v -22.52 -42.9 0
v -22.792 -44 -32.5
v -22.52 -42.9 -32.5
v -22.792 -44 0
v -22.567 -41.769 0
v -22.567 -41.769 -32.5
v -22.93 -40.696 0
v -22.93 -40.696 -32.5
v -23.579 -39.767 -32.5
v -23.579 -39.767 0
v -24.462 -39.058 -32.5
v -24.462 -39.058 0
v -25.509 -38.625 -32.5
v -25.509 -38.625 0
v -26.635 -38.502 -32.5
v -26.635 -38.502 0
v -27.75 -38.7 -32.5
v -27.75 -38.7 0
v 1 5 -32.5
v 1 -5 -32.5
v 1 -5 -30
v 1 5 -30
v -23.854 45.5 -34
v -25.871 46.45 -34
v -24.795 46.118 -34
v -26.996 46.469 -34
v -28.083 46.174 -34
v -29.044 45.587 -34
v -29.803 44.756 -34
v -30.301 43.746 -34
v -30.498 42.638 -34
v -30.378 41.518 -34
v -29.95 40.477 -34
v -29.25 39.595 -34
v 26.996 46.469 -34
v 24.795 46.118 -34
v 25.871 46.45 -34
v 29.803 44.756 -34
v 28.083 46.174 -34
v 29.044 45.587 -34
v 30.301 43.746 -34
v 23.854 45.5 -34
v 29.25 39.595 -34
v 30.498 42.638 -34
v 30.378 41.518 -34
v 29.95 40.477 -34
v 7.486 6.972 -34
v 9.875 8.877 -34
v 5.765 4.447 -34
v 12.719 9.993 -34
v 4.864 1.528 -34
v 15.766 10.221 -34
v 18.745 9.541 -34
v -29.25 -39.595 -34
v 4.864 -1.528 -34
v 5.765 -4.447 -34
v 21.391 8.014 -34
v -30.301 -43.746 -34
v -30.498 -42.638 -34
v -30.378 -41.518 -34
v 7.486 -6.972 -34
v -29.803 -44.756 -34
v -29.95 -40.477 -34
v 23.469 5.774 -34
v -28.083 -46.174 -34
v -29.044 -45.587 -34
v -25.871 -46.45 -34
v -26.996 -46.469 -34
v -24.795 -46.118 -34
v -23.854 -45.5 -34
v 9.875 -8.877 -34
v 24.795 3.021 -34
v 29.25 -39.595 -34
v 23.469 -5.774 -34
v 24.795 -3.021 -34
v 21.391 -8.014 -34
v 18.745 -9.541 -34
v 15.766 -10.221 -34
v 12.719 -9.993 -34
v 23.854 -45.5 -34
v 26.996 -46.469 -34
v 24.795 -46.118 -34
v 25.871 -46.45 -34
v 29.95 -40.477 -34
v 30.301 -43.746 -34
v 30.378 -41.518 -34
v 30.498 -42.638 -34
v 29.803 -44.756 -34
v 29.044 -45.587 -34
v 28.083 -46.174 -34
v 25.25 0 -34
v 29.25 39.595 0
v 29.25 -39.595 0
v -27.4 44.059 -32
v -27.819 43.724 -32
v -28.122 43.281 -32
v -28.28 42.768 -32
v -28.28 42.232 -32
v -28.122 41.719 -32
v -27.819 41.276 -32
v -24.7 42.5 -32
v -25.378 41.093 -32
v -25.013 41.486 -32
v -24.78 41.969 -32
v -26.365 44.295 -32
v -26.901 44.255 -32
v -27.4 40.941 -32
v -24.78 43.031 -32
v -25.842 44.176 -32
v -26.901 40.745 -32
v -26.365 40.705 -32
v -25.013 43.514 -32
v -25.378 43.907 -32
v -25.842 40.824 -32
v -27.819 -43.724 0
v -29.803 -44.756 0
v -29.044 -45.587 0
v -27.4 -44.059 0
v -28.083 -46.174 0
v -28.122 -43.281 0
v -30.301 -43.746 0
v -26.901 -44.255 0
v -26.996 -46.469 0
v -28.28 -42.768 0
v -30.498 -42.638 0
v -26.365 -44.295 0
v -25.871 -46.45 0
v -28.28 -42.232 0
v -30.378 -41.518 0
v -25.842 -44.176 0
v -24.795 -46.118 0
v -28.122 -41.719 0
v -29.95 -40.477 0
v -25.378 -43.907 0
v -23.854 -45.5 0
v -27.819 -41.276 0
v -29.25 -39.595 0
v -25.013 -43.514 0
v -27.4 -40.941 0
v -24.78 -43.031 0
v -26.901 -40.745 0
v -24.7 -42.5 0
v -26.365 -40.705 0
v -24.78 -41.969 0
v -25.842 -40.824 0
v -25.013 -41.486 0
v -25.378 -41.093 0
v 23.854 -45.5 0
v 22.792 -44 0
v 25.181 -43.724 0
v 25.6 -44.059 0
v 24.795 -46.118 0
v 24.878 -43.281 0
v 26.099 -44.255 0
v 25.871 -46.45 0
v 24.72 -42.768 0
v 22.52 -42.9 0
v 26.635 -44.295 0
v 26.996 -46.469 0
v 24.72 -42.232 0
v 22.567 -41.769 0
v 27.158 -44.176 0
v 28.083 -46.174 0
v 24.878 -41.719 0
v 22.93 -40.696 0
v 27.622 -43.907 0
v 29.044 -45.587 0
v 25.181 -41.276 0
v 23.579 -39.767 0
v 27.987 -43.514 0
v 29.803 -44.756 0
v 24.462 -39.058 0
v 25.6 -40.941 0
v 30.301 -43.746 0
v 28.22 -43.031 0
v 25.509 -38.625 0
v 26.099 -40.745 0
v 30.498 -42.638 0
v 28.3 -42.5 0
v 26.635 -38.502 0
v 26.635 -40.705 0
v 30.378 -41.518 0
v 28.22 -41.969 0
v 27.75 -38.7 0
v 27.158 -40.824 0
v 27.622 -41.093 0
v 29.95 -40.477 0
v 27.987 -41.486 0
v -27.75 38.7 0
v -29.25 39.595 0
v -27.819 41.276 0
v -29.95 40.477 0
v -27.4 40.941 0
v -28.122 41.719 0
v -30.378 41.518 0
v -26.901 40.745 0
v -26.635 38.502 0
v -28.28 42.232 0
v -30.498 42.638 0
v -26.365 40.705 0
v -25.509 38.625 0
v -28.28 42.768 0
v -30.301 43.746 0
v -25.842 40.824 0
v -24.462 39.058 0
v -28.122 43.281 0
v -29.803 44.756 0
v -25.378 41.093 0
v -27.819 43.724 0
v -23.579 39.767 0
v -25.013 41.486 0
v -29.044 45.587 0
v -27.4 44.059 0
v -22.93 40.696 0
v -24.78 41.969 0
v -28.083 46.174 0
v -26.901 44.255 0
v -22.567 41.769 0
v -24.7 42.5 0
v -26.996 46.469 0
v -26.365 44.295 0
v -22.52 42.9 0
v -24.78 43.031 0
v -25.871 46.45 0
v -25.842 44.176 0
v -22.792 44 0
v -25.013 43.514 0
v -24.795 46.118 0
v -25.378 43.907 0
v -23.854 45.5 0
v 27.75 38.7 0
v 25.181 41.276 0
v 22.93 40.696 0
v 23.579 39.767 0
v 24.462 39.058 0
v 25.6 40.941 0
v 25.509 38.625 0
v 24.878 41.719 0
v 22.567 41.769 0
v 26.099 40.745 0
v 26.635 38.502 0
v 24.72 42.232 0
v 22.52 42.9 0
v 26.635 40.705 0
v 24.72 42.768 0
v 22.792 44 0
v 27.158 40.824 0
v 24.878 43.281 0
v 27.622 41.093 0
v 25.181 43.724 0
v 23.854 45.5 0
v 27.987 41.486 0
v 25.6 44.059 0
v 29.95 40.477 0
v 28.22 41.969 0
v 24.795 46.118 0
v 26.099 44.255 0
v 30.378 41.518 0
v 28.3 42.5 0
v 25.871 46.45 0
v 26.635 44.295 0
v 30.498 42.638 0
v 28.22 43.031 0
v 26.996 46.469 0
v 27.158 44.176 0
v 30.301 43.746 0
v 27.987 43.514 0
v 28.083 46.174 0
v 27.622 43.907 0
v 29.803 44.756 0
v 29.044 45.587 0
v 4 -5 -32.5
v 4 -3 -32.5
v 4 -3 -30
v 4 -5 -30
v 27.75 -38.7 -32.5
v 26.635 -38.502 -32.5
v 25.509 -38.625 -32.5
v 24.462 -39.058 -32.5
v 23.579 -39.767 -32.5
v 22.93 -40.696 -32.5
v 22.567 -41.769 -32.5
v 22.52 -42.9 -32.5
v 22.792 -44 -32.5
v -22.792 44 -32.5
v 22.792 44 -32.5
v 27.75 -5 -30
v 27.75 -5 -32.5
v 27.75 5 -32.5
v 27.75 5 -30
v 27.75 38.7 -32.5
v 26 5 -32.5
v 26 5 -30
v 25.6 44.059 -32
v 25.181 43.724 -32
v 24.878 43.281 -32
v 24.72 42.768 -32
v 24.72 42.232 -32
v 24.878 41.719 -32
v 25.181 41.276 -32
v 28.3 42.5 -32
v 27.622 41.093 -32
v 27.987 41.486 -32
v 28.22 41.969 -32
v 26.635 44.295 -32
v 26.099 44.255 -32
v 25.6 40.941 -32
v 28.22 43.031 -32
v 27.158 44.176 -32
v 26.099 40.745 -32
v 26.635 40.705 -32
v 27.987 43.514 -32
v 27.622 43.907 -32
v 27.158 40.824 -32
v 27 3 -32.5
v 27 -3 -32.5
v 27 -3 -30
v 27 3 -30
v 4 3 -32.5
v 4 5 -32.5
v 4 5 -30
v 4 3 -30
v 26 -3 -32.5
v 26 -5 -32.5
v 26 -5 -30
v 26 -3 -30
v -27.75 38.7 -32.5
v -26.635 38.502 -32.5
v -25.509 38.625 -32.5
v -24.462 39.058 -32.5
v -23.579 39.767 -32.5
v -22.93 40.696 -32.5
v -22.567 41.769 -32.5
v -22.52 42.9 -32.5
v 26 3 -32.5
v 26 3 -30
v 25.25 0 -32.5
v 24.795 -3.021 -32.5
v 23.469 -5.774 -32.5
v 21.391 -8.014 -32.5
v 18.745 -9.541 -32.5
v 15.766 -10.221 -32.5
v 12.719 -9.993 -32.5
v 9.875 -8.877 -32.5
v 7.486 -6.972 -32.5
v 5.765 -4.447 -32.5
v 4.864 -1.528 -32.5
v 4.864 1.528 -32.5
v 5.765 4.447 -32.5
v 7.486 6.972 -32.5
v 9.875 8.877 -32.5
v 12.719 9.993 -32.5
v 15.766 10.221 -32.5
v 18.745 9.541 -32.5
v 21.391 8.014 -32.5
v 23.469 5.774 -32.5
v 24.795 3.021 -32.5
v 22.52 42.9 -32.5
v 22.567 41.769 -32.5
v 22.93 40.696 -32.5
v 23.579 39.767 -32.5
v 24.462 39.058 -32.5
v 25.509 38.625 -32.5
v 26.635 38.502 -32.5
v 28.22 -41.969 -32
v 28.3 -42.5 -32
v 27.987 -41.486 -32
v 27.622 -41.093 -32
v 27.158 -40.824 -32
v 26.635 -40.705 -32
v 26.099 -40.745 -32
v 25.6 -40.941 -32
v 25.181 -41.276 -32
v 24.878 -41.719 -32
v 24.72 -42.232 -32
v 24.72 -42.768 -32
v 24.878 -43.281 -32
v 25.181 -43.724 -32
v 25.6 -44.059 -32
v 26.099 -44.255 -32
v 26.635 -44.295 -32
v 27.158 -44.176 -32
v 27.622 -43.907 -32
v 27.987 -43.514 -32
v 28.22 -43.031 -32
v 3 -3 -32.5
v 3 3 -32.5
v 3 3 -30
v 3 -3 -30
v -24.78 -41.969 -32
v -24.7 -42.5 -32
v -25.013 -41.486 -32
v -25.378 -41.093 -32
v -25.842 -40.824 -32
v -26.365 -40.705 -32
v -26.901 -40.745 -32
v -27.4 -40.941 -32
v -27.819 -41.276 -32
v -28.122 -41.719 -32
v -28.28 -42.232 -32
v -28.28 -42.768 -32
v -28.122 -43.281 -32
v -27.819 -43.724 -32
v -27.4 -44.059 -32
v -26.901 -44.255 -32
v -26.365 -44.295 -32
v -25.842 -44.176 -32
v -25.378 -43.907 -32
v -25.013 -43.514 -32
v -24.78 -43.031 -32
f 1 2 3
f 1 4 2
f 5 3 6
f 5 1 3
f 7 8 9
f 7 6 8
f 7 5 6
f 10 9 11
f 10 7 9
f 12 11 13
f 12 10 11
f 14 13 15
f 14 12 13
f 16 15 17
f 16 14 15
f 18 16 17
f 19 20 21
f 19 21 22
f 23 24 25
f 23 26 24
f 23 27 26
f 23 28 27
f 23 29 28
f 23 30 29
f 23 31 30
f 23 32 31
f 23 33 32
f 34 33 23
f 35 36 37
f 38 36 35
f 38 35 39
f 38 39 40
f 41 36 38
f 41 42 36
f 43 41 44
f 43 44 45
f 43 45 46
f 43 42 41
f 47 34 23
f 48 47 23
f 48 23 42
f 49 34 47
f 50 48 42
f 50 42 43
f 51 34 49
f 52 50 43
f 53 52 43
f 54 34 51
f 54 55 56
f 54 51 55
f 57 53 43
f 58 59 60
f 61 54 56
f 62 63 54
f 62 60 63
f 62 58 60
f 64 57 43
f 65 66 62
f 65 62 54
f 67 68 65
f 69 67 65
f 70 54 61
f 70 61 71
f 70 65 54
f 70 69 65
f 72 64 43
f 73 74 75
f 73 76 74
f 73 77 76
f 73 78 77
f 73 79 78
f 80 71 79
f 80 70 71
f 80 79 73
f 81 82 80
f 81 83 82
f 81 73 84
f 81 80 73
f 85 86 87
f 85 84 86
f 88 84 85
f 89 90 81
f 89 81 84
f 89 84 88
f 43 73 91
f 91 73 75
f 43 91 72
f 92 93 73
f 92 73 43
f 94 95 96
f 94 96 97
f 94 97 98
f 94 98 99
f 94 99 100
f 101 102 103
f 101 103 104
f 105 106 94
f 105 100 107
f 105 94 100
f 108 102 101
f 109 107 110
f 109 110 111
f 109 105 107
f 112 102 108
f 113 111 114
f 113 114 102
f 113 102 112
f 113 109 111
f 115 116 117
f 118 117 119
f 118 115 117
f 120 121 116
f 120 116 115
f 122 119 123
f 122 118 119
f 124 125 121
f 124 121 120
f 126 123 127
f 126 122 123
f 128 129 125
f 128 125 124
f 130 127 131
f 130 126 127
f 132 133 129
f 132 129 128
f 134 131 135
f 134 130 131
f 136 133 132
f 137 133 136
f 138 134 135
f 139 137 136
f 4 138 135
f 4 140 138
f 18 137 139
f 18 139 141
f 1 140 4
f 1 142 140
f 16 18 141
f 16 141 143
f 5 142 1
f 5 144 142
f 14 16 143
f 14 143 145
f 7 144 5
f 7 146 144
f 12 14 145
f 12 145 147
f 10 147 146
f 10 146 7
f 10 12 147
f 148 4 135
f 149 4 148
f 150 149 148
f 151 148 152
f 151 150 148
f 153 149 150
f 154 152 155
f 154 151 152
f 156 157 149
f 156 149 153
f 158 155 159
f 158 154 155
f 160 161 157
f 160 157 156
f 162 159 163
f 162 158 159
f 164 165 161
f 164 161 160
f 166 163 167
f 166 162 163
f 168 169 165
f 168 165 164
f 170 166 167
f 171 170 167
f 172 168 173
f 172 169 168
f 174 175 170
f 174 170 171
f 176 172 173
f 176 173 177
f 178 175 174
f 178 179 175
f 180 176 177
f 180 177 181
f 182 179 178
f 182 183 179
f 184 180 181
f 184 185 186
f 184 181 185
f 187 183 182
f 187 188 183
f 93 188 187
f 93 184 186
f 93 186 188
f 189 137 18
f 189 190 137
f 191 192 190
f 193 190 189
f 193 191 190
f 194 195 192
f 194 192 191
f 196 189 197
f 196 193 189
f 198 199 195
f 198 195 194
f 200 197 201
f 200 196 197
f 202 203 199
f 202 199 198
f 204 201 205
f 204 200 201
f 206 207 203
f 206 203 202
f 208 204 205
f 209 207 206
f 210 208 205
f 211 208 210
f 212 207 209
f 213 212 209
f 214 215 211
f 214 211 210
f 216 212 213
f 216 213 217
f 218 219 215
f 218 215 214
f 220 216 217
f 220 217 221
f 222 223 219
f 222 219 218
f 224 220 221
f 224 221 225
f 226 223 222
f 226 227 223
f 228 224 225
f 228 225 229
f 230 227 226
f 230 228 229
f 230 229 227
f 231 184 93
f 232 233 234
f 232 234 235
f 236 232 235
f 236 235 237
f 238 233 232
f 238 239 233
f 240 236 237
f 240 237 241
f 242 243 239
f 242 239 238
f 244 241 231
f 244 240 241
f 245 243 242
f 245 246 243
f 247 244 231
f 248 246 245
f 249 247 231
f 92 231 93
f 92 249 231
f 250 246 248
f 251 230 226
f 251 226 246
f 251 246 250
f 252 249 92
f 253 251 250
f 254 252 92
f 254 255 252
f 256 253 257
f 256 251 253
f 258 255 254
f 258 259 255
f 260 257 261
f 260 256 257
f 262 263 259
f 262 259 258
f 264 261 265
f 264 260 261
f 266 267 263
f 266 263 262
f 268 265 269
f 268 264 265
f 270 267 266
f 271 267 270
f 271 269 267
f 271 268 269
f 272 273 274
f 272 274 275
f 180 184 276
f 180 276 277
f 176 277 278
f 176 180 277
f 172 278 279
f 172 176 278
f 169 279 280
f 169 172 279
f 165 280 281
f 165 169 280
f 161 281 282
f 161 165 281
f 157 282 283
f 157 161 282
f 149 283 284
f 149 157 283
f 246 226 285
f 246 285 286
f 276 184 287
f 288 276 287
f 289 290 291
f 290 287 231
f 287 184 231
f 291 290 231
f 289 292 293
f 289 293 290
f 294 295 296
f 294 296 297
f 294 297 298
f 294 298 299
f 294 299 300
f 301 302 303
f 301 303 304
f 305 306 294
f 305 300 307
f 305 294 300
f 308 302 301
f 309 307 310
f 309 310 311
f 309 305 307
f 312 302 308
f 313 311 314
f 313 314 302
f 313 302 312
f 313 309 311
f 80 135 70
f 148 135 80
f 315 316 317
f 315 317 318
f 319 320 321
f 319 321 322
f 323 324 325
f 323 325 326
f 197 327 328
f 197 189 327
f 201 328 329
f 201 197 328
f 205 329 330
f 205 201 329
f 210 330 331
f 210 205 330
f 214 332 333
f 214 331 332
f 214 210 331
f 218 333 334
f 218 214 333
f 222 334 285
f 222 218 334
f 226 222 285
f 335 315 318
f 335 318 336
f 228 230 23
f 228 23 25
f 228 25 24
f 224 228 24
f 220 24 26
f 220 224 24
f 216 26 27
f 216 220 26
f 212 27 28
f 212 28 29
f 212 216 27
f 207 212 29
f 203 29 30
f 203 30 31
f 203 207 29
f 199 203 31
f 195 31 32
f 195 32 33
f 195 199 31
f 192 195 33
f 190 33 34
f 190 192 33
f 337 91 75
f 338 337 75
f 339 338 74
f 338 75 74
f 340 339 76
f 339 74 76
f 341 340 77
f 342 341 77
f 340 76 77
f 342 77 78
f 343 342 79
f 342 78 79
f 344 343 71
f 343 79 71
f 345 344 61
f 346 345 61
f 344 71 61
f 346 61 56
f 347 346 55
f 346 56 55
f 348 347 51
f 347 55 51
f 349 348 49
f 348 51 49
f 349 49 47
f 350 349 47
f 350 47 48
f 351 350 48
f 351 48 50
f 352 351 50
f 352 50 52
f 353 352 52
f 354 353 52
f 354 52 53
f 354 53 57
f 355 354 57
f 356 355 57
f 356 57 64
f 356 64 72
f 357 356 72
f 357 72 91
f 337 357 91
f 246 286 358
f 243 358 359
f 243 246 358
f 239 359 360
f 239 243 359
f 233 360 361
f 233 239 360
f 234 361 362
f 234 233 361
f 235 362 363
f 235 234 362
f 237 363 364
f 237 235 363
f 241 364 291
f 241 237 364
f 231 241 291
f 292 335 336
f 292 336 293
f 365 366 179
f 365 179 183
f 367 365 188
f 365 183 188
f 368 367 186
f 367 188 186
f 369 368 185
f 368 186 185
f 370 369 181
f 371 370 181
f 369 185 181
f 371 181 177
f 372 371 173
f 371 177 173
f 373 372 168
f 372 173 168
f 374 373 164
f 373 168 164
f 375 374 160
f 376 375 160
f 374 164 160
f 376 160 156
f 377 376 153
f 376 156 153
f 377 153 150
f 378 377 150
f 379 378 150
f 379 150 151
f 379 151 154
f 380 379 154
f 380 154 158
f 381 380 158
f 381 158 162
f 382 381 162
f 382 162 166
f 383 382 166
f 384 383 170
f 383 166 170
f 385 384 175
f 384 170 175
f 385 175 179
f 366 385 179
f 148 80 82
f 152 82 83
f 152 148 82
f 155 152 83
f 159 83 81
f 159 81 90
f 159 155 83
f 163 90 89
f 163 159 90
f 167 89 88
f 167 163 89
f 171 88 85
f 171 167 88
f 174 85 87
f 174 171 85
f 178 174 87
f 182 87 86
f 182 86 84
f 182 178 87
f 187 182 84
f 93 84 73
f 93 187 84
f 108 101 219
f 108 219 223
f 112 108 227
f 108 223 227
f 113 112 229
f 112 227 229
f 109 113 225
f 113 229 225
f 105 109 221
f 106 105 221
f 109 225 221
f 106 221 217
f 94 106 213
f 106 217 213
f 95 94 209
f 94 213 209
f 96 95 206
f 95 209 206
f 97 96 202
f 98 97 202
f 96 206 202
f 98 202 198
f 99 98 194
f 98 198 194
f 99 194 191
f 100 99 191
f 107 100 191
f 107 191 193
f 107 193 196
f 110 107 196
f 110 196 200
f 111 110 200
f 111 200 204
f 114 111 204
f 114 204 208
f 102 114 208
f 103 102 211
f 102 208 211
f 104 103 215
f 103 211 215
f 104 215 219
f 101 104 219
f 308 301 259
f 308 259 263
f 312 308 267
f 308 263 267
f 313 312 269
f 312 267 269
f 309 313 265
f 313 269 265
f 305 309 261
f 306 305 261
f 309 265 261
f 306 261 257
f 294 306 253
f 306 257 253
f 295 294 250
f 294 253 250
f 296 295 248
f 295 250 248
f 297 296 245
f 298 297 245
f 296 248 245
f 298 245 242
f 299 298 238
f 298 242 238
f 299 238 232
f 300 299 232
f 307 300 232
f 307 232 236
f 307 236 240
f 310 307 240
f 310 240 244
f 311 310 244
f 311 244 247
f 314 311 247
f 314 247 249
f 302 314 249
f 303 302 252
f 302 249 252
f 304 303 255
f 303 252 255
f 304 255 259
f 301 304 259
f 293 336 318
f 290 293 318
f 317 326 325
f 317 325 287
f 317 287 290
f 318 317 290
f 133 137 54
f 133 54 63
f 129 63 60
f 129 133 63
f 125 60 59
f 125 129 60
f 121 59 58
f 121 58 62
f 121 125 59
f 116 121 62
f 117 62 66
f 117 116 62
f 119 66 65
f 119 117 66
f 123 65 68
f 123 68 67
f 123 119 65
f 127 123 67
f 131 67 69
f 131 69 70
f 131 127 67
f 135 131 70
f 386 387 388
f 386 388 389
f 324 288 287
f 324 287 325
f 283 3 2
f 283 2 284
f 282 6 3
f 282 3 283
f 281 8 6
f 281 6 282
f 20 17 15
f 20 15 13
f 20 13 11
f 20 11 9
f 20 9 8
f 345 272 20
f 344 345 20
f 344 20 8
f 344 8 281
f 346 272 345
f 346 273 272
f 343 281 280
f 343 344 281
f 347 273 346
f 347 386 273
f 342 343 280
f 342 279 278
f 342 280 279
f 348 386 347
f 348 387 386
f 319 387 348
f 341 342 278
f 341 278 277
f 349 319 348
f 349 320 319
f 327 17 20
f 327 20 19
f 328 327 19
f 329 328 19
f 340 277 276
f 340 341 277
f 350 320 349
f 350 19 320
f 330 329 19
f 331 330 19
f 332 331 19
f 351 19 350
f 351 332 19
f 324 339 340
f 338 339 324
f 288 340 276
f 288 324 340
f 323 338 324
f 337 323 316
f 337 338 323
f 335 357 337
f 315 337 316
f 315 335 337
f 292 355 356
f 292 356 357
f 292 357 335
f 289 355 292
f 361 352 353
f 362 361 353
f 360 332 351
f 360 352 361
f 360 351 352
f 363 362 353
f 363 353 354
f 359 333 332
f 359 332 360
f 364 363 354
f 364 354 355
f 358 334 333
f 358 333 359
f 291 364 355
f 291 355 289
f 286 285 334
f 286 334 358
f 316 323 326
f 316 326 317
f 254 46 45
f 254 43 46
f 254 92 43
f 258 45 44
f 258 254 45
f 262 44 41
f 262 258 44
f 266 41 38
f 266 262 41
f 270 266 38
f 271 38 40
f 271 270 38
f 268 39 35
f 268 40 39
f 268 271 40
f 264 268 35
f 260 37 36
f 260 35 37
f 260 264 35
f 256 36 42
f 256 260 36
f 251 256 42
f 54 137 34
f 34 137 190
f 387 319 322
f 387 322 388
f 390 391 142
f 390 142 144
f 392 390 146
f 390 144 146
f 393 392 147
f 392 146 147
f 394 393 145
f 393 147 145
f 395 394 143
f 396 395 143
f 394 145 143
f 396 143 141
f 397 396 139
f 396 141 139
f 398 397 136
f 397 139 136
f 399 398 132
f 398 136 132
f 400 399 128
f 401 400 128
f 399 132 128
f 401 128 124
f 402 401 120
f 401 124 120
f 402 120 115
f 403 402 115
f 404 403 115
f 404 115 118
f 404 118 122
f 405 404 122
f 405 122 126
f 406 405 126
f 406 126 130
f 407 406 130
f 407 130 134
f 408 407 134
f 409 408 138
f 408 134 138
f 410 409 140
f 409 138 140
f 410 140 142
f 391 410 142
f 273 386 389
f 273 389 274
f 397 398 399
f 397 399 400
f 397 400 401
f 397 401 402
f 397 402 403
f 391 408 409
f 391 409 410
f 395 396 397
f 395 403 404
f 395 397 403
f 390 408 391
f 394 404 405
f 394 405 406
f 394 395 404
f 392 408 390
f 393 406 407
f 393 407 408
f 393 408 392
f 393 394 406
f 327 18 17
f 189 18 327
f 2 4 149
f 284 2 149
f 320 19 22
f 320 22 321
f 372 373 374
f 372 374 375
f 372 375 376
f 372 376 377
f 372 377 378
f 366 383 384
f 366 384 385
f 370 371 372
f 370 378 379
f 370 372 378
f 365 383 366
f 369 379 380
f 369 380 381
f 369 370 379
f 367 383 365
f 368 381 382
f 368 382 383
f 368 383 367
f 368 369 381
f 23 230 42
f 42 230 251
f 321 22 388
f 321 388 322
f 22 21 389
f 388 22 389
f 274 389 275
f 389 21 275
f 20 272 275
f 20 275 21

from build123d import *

# Parameters (mm, degrees)
F0_W      = 58.5
F0_H      = 91
F1_DEPTH  = 34
F2_T      = -1.5
F3_R      = 3
F4_R      = 2
F5_R      = 4
F6_DEPTH  = 34
F7_R      = 1.8
F8_DEPTH  = 32
F12_DEPTH = 4
F10_R     = 10.25
F13_DEPTH = 25


with BuildPart() as f1:
    # F0 (on Top) → F1 (new body)
    with BuildSketch(Plane.XY):
        Rectangle(F0_W, F0_H)
    extrude(amount=-F1_DEPTH)

    # F2
    f2_openings = [f1.faces().sort_by_distance(p)[0] for p in [
        (0, 0, 0),
    ]]
    offset(amount=F2_T, openings=f2_openings)

    # F3
    f3_edges = [f1.edges().sort_by_distance(p)[0] for p in [
        (-29.25, 45.5, -17),
        (29.25, 45.5, -17),
        (-29.25, -45.5, -17),
        (29.25, -45.5, -17),
    ]]
    fillet(f3_edges, radius=F3_R)

    # F4
    f4_edges = [f1.edges().sort_by_distance(p)[0] for p in [
        (-27.75, 44, -16.25),
        (-27.75, -44, -16.25),
        (27.75, -44, -16.25),
        (27.75, 44, -16.25),
    ]]
    fillet(f4_edges, radius=F4_R)

    # F5 (on face) → F6 (join)
    with BuildSketch(Plane.XY):
        with Locations((26.5, -42.5)):
            Circle(F5_R)
        with Locations((26.5, 42.5)):
            Circle(F5_R)
        with Locations((-26.5, 42.5)):
            Circle(F5_R)
        with Locations((-26.5, -42.5)):
            Circle(F5_R)
    extrude(amount=-F6_DEPTH)

    # F7 (on Top) → F8 (cut)
    with BuildSketch(Plane.XY):
        with Locations((26.5, -42.5)):
            Circle(F7_R)
        with Locations((26.5, 42.5)):
            Circle(F7_R)
        with Locations((-26.5, -42.5)):
            Circle(F7_R)
        with Locations((-26.5, 42.5)):
            Circle(F7_R)
    extrude(amount=-F8_DEPTH, mode=Mode.SUBTRACT)

    # F11 (on face) → F12 (join)
    with BuildSketch(Plane(origin=(0, 0, -34), x_dir=(1, 0, 0), z_dir=(0, 0, -1))):
        Polygon((26, -5), (29, -5), (29, 5), (26, 5), (26, 3), (27, 3), (27, -3), (26, -3), align=None)
        Polygon((1, 5), (1, -5), (4, -5), (4, -3), (3, -3), (3, 3), (4, 3), (4, 5), align=None)
    extrude(amount=-F12_DEPTH)

    # F10 (on face) → F13 (cut)
    with BuildSketch(Plane(origin=(0, 0, -34), x_dir=(1, 0, 0), z_dir=(0, 0, -1))):
        with Locations((15, 0)):
            Circle(F10_R)
    extrude(amount=-F13_DEPTH, mode=Mode.SUBTRACT)


solid = f1.part
